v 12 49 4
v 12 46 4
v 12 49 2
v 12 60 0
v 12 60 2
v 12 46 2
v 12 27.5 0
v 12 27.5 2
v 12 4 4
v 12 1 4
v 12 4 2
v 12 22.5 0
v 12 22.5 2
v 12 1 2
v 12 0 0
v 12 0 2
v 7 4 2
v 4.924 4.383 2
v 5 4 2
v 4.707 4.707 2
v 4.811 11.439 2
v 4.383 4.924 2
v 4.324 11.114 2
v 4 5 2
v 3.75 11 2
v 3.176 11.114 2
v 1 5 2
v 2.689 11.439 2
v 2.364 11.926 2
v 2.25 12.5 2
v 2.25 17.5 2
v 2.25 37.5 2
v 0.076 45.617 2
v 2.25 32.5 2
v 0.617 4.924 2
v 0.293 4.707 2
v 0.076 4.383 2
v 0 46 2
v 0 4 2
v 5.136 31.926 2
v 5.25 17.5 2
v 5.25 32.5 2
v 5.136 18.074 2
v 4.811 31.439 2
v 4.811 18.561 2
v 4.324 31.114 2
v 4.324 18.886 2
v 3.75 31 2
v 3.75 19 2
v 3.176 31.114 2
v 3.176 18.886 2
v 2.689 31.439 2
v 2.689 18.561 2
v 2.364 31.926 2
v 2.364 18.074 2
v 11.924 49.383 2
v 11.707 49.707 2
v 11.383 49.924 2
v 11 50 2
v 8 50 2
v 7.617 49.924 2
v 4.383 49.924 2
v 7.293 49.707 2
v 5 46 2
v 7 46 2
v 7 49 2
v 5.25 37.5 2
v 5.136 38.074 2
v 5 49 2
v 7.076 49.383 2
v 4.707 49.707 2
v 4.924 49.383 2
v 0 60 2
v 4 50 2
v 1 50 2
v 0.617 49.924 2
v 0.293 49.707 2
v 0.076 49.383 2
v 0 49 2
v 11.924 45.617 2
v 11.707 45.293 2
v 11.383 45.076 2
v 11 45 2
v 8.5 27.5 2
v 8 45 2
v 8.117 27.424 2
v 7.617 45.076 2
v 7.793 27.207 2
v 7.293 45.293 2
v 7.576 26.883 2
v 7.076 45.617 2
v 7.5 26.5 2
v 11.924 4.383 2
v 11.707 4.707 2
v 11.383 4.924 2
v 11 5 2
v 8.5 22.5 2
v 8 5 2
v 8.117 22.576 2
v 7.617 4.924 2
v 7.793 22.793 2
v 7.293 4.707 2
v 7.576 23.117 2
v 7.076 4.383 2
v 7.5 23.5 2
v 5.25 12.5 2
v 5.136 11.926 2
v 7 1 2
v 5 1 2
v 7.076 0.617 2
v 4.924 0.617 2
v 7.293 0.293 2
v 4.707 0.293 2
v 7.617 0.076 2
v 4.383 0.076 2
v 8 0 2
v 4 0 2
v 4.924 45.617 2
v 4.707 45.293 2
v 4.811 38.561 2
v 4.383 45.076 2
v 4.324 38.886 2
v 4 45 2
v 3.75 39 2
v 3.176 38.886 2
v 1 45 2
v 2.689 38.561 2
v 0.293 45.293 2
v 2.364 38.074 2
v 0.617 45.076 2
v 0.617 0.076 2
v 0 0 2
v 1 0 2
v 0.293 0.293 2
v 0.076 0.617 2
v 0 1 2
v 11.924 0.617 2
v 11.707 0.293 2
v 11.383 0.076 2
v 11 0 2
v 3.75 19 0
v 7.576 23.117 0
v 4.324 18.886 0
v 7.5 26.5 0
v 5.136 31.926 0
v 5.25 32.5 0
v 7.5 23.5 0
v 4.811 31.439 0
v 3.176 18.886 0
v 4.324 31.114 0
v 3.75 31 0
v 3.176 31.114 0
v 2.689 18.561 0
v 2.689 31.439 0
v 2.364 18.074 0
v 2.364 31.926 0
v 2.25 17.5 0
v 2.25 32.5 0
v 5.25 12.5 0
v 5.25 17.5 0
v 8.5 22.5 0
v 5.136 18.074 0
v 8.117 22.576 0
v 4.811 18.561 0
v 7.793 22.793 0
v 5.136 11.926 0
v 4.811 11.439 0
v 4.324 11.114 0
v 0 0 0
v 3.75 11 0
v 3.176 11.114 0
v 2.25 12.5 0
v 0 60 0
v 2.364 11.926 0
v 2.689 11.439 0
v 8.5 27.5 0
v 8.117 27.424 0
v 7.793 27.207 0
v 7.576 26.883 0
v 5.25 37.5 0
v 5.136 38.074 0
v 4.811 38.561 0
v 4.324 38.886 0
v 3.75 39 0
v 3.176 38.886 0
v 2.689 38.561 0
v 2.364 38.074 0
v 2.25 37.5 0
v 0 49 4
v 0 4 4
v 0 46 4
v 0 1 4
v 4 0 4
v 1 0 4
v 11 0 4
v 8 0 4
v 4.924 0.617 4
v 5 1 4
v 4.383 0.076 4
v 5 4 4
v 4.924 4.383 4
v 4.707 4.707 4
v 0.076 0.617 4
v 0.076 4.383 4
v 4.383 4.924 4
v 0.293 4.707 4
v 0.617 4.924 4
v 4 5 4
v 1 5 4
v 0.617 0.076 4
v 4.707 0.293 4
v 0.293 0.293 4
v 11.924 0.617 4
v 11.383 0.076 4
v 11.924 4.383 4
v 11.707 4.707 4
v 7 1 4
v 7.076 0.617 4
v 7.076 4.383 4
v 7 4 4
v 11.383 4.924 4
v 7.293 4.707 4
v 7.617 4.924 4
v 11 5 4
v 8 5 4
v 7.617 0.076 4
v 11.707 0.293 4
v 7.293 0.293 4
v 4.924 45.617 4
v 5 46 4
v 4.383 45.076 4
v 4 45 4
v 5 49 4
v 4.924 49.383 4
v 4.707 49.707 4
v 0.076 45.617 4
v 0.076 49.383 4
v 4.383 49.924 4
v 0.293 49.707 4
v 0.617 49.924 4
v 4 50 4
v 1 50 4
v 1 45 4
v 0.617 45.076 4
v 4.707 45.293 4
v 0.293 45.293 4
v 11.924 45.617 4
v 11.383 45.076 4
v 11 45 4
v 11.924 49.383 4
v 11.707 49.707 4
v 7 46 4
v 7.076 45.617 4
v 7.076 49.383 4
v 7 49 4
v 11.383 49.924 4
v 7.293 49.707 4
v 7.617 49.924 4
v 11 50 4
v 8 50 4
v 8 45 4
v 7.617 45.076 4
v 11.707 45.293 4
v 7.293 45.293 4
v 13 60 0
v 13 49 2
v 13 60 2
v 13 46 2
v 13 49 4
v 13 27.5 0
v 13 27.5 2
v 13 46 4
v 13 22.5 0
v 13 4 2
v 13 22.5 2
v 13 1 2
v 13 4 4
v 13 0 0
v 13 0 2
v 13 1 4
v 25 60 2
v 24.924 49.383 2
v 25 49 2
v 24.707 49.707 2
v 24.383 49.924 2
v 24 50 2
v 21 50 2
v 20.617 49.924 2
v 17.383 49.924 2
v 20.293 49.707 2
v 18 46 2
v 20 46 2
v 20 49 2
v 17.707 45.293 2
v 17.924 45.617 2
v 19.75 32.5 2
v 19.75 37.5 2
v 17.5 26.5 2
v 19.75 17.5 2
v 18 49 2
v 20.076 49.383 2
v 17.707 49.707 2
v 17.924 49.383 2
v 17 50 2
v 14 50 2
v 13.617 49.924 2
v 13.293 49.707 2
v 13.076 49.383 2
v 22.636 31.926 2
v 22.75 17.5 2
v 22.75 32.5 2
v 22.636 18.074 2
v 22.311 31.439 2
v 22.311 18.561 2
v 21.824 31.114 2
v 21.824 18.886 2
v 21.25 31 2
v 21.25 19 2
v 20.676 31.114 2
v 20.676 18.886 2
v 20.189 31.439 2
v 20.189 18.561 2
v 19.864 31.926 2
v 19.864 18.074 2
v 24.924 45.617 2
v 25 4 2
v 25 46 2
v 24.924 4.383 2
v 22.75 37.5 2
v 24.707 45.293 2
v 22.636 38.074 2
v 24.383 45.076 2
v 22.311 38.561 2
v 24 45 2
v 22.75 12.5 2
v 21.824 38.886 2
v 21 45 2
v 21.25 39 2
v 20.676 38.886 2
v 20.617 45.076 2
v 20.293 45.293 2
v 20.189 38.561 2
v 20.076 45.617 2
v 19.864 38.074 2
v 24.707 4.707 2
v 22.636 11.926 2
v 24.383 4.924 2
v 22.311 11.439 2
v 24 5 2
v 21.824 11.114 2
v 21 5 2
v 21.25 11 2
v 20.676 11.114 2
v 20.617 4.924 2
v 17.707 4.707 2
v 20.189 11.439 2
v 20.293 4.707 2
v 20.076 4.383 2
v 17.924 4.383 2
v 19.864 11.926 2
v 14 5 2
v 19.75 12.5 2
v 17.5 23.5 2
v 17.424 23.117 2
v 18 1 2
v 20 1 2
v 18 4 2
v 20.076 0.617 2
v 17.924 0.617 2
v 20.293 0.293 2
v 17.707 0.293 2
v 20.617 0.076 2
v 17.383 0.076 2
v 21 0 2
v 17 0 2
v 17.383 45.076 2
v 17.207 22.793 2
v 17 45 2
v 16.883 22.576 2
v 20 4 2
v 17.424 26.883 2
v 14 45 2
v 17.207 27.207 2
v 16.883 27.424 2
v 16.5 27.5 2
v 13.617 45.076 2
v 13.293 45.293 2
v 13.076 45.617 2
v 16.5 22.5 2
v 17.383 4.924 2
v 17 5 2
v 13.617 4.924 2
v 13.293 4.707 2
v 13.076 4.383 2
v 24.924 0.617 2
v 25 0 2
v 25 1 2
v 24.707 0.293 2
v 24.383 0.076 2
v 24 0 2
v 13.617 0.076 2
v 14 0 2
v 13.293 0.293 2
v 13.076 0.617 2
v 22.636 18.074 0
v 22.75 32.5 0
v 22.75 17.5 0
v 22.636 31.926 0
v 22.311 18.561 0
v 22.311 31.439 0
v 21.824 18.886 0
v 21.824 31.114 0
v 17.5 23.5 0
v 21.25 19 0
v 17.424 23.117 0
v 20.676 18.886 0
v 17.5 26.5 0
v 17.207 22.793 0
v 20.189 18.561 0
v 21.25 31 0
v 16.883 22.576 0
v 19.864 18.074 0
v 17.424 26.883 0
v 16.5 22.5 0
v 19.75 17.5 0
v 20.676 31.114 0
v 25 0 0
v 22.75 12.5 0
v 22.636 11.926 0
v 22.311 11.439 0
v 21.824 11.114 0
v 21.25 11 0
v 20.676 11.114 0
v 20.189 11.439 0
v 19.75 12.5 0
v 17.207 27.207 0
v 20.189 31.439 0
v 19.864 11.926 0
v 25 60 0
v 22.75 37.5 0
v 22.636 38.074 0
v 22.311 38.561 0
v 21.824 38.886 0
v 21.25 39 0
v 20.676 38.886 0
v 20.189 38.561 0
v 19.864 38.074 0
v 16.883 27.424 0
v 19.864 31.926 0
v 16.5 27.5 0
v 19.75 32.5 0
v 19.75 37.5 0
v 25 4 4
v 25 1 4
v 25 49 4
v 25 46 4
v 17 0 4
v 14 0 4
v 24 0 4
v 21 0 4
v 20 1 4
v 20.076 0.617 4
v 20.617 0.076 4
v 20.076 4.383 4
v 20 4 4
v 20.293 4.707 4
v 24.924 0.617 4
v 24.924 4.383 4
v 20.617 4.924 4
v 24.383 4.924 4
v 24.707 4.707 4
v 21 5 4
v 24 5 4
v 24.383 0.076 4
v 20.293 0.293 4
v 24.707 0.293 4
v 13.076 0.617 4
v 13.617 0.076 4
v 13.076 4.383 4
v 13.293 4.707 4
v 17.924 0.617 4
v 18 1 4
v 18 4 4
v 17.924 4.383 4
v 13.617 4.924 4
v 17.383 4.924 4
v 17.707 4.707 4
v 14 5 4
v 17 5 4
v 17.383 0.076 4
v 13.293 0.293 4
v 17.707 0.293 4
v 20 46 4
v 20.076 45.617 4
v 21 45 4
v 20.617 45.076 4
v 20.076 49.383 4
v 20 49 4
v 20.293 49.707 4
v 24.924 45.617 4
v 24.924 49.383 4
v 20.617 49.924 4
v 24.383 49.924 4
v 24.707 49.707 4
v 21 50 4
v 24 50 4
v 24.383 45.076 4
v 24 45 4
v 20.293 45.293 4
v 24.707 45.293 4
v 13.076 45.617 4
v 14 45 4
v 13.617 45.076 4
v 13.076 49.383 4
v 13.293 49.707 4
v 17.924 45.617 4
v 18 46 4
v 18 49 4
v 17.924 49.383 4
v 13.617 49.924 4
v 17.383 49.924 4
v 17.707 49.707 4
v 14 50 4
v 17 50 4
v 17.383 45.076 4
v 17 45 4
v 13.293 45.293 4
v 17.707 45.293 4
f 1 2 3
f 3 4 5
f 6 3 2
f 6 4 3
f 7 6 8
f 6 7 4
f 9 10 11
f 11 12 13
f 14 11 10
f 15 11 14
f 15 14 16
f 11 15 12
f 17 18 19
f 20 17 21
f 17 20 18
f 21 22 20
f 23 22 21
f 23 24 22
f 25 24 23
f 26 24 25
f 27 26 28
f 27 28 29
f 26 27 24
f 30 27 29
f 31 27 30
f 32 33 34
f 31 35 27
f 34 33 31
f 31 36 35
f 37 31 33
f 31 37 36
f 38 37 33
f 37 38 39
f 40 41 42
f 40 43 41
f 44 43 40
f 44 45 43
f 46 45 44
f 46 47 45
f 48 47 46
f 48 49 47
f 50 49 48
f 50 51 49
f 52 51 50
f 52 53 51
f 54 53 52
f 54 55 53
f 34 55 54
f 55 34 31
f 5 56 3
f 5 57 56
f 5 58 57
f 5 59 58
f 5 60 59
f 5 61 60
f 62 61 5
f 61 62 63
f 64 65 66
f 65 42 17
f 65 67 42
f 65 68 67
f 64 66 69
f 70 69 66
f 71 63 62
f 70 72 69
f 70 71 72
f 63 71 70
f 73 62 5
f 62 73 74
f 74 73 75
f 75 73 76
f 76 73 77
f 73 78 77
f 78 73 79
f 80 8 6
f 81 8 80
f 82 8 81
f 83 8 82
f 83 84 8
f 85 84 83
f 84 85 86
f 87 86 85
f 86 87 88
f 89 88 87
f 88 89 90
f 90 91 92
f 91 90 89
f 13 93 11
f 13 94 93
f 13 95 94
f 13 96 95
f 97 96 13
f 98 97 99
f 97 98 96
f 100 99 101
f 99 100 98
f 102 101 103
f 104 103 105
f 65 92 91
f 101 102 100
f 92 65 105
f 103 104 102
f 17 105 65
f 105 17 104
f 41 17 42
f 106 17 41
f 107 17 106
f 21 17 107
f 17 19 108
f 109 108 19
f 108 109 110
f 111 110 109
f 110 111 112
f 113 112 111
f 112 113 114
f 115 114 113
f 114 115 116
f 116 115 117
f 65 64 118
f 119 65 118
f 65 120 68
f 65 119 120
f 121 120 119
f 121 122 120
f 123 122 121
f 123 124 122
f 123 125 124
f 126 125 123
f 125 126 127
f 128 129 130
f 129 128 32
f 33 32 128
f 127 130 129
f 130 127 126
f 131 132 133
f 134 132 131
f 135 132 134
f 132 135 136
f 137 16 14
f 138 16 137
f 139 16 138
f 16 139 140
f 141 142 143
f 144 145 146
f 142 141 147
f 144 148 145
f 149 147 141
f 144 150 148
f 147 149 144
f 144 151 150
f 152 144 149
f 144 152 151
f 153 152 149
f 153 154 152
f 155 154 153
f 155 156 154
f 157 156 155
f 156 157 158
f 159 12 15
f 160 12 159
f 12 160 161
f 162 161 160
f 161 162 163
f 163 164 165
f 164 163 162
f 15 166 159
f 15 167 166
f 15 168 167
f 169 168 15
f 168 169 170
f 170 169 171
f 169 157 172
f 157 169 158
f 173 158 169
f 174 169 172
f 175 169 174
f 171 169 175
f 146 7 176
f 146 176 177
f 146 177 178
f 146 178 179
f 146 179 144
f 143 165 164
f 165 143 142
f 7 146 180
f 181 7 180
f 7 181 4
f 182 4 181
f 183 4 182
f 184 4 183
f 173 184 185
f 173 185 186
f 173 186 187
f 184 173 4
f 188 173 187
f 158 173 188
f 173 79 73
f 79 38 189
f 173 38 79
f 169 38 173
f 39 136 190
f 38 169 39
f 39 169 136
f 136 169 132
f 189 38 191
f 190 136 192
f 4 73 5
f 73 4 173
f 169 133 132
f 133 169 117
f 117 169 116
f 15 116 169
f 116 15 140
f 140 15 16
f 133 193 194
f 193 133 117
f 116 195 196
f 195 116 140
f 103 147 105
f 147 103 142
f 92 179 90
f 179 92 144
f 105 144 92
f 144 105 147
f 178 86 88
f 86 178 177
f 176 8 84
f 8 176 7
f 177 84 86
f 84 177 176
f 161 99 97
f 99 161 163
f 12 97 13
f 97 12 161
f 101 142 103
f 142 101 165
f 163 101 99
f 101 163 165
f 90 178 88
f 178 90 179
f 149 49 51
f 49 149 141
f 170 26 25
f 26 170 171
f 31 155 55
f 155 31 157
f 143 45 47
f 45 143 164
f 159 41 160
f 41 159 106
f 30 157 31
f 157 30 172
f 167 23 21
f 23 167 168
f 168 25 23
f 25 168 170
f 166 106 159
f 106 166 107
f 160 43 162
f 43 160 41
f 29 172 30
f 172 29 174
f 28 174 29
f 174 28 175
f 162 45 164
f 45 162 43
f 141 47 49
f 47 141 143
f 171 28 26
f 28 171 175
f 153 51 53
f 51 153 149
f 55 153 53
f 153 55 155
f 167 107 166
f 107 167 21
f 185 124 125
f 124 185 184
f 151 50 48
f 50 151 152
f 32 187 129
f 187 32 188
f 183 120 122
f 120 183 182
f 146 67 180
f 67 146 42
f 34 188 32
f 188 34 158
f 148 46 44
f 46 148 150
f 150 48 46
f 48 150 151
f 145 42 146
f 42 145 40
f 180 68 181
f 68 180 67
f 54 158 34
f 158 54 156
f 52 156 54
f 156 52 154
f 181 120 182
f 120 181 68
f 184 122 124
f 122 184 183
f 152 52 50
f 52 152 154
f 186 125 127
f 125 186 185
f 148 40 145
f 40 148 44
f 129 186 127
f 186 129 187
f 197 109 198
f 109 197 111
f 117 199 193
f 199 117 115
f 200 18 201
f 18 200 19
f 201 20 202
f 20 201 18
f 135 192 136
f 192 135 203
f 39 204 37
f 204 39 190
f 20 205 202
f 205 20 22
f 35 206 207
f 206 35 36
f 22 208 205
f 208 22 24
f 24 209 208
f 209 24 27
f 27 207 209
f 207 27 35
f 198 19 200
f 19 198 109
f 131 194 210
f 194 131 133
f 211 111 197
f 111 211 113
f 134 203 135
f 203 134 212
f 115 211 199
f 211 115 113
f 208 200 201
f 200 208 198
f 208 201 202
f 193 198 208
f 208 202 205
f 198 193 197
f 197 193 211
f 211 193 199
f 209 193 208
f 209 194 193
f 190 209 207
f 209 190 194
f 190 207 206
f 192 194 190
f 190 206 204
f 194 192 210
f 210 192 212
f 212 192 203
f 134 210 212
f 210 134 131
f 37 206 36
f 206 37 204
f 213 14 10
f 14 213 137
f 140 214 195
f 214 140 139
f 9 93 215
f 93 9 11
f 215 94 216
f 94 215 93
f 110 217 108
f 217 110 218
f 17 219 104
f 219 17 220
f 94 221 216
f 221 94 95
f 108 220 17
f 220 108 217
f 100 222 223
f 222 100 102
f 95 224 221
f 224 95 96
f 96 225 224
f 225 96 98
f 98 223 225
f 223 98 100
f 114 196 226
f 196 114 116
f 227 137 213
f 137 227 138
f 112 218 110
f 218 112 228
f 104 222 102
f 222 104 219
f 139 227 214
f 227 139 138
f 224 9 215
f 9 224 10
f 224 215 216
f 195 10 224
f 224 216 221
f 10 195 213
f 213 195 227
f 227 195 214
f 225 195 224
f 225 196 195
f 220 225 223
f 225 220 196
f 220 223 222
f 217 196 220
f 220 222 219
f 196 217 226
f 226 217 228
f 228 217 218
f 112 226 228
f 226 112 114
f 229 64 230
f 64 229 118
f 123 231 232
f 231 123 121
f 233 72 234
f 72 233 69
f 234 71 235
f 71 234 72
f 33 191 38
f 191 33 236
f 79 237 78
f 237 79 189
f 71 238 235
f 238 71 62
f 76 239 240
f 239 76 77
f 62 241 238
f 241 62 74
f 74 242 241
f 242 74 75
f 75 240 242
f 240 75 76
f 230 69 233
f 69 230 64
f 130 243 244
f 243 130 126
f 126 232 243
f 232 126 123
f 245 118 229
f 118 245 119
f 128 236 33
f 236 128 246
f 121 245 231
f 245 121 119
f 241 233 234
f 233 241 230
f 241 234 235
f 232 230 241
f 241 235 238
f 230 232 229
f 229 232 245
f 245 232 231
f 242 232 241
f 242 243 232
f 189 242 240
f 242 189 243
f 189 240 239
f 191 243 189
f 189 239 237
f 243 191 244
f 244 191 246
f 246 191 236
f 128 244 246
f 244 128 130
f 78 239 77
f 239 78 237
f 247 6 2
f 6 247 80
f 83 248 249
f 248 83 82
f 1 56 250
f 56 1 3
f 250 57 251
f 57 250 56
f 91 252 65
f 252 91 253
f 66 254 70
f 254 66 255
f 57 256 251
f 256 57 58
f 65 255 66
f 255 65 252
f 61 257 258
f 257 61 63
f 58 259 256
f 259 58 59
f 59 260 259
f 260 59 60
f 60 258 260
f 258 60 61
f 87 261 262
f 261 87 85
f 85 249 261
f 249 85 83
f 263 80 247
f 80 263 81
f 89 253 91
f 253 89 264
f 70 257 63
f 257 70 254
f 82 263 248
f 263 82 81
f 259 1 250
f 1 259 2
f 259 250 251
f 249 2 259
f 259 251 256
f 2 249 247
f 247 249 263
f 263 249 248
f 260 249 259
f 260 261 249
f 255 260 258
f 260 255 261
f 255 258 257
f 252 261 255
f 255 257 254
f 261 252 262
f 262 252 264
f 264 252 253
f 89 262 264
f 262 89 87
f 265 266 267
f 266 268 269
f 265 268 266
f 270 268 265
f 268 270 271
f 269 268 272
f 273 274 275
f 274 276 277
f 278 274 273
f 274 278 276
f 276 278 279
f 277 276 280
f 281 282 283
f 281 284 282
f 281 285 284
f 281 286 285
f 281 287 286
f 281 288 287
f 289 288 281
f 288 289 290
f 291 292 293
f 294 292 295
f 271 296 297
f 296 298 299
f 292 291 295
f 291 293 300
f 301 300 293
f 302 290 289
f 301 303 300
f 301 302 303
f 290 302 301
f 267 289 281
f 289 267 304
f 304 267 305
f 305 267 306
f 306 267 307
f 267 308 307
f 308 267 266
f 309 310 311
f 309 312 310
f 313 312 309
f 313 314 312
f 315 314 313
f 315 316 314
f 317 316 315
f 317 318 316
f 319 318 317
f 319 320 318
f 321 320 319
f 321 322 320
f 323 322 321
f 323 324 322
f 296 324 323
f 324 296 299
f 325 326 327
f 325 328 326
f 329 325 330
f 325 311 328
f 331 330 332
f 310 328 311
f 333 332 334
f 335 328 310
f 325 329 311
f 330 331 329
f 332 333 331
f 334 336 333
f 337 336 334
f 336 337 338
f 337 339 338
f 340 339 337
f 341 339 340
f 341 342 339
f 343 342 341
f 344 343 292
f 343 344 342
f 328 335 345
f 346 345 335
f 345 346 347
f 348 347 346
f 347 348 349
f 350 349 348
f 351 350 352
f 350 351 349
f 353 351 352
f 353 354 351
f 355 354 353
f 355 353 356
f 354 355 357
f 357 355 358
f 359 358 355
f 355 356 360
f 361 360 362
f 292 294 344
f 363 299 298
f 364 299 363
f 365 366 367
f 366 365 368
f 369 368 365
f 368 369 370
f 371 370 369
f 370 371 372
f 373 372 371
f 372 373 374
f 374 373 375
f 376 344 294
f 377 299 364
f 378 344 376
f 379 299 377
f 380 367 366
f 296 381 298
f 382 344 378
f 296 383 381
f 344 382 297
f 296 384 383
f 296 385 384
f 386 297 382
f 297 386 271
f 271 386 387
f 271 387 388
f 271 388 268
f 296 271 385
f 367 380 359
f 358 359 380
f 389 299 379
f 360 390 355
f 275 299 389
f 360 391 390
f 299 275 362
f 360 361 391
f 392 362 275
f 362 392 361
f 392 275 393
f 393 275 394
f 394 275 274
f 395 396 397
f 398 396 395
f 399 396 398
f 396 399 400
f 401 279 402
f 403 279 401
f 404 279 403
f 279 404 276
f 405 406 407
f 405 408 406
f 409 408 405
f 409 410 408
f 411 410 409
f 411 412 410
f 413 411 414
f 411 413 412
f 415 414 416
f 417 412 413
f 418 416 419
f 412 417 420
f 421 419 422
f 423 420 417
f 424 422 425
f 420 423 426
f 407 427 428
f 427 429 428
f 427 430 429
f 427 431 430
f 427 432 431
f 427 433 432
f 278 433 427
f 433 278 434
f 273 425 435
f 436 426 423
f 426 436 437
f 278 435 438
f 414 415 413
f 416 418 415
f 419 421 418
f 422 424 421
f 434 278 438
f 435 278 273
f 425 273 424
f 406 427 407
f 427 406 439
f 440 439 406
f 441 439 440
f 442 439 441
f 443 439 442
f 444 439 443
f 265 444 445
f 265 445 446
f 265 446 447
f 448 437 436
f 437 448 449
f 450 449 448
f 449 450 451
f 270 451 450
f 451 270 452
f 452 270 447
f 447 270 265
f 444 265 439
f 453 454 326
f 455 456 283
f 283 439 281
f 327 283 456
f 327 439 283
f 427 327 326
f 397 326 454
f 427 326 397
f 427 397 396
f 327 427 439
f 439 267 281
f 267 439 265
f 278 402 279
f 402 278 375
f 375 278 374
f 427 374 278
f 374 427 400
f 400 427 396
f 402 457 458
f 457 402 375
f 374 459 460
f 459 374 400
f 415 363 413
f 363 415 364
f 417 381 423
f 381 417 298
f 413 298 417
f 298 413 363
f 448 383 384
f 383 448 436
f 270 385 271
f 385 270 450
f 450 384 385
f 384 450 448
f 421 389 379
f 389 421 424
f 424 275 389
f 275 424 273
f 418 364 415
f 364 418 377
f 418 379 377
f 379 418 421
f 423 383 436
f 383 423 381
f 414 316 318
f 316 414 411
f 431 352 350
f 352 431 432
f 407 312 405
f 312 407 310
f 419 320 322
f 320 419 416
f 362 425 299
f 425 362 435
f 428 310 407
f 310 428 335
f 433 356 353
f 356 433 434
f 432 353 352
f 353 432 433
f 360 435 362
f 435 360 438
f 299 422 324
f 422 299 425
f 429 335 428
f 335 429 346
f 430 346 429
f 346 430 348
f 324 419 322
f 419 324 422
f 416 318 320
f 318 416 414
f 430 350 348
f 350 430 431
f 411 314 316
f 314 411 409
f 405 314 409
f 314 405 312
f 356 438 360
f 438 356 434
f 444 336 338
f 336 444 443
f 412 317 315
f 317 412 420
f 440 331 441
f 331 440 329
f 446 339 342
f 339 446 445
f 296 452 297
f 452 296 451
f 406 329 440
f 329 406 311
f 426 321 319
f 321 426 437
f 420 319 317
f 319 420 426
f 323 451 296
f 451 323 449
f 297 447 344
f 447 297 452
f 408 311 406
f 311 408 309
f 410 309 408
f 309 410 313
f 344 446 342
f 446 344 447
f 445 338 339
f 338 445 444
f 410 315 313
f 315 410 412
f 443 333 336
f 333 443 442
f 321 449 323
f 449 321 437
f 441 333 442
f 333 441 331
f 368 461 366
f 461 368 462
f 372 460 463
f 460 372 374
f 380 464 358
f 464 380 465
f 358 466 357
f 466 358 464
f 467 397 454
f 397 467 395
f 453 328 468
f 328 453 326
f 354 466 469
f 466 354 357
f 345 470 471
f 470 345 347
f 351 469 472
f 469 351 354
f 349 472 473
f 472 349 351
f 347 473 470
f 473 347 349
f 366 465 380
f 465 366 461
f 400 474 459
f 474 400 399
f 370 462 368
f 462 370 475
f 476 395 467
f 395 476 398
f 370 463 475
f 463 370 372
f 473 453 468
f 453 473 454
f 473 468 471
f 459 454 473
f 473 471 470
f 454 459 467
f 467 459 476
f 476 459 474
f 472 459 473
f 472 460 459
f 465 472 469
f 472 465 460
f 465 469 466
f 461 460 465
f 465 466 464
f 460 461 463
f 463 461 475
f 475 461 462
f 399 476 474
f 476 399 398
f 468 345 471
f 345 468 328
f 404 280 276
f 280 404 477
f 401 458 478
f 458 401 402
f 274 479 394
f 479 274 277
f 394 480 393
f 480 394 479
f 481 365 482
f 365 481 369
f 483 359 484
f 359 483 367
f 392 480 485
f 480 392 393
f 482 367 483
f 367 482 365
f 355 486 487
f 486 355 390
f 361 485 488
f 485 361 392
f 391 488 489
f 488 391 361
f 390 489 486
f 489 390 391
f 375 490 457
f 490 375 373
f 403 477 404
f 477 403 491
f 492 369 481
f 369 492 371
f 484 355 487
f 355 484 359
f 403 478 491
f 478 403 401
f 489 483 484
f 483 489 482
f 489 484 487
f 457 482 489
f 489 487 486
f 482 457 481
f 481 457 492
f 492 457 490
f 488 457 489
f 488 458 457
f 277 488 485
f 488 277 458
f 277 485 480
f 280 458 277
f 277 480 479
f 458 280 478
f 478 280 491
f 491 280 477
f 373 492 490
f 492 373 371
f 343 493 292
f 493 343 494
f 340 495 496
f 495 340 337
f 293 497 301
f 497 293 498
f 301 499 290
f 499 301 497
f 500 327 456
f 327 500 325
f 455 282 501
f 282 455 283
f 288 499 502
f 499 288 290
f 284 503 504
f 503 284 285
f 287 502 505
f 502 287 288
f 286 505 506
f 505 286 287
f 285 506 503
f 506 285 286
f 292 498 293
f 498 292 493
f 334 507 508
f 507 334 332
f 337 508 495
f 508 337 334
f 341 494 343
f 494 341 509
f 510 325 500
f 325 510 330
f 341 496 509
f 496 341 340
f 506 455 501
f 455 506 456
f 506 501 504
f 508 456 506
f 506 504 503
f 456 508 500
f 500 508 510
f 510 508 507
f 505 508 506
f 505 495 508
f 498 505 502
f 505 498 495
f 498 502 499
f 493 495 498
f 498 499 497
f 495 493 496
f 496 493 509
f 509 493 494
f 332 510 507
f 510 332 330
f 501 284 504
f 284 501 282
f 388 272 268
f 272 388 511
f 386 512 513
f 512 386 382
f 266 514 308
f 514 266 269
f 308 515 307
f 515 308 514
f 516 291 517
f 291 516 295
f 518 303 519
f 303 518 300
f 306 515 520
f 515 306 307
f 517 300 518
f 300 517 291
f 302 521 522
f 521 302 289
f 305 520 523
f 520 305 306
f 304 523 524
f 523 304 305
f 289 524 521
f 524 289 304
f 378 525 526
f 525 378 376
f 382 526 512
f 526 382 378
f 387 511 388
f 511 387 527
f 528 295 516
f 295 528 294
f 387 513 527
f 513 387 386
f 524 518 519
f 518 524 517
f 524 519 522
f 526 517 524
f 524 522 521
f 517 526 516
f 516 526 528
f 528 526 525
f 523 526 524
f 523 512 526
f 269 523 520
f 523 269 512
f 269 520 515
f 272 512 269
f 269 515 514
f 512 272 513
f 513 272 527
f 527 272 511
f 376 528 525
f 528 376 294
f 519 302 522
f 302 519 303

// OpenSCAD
// file: basics.scad
// basics 1

$fn = 16;

cellRadius = 1.0;

cellSize = 5.0;

layerHeight = 2.0;

pinOffset = 0.15;

module cellCorner(height = layerHeight) {
    cylinder(h = height, r = cellRadius);
}

module cell(height = layerHeight) {
    translate([0, 0, 0]) {
        hull() {
            translate([cellRadius,            cellRadius, 0])            cellCorner(height);
            translate([cellSize - cellRadius, cellRadius, 0])            cellCorner(height);
            translate([cellRadius,            cellSize - cellRadius, 0]) cellCorner(height);
            translate([cellSize - cellRadius, cellSize - cellRadius, 0]) cellCorner(height);
        }
    }
}

module pin(pinOffset = 0) {
    cylinder(h = layerHeight + 0.2, r = cellRadius * 1.5 - pinOffset);
}
// main file
// b-c blech 3

$fn = 16;

cellRadius = 1.0;

cellSize = 5.0;

layerHeight = 2.0;

pinOffset = 0.15;
pinXOffset = 0.75;

blechWidth  = cellSize * 7;
blechLength = cellSize * 7;


use <basics.scad>


module pinSlitY() {
    color("gray") hull() {
        translate([0, 0       , 0]) pin();
        translate([0, cellSize, 0]) pin();
    }
}

module bcBlech() {
    difference() {
        color("blue") cube([cellSize * 2.4, blechWidth + cellSize * 5, layerHeight]);
        translate([cellSize * 1.5, blechWidth / 2 + cellSize, -0.1]) 
            color("red") cell(layerHeight + 0.2);
        translate([cellSize * 2, blechWidth / 2 + cellSize, -0.1]) 
            color("red") cube([cellSize, cellSize, layerHeight + 0.2]);
        translate([cellSize * pinXOffset, cellSize * 2.5, -0.1]) pinSlitY();
        translate([cellSize * pinXOffset, cellSize * 6.5, -0.1]) pinSlitY();
    }

    translate([0, 0, layerHeight]) color("blue") cell();
    translate([cellSize * 1.4, 0, layerHeight]) color("blue") cell();
    translate([0, blechWidth + cellSize * 2, layerHeight]) color("blue") cell();
    translate([cellSize * 1.4, blechWidth + cellSize * 2, layerHeight]) color("blue") cell();
}

bcBlech();
translate([cellSize * 5, 0, 0]) 
    mirror([180, 0, 0])
        bcBlech();

//translate([-cellSize, cellSize, layerHeight]) color("gray") cube([blechWidth, blechLength, layerHeight]);
